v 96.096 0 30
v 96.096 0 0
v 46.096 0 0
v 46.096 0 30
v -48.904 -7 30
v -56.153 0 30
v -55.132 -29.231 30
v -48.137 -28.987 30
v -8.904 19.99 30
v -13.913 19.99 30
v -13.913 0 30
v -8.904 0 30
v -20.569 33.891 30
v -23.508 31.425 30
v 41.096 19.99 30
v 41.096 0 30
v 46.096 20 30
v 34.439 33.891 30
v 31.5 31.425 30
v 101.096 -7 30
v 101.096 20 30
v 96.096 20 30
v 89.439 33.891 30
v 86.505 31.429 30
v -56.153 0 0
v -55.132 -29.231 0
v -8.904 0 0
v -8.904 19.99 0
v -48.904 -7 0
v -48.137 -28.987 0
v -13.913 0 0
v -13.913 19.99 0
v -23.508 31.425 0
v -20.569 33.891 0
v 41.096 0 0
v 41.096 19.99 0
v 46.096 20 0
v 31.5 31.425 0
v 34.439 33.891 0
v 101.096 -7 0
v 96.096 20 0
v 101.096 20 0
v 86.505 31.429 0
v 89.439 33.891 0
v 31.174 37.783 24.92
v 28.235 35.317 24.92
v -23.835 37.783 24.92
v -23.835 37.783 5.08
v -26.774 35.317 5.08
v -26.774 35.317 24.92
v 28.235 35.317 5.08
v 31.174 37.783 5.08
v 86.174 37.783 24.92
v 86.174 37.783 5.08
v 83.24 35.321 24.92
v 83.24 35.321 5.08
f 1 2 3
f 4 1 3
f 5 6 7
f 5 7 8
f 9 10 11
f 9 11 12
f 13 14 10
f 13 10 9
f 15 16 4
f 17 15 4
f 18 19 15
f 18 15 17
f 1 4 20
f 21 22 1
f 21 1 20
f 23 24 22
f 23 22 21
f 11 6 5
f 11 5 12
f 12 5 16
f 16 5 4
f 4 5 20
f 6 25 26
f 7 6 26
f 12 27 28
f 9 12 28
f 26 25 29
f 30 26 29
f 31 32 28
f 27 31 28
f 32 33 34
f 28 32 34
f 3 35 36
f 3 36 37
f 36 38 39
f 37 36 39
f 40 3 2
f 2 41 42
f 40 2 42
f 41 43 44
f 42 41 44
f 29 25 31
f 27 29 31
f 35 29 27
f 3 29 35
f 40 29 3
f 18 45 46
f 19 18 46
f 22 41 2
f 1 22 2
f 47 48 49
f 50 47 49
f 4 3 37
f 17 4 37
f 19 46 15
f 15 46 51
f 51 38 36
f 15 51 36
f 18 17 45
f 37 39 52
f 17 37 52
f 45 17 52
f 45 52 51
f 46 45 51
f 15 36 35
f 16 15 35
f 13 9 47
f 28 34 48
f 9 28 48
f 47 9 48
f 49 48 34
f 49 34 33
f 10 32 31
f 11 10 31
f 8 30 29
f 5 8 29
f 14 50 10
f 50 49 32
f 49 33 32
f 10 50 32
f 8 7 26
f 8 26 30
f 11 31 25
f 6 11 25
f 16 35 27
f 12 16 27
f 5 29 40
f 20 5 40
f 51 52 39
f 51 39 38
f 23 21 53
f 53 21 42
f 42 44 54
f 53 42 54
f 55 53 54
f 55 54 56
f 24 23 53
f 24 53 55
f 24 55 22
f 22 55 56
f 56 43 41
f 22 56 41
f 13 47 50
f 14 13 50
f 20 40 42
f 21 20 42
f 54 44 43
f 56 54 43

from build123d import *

# Parameters (mm, degrees)
F1_DEPTH = 30
F2_SIZE2 = 5.08
F2_SIZE  = 5.08


with BuildPart() as f1:
    # F0 (on Top) → F1 (new body)
    with BuildSketch(Plane.XY):
        Polygon((-48.136686, -28.986598), (-48.904475, -7), (101.095525, -7), (101.095525, 20), (86.173893, 37.782908), (83.239773, 35.320889), (96.095525, 20), (96.095525, 0), (46.095525, 0), (46.095525, 20), (31.173893, 37.782908), (28.23475, 35.316674), (41.095525, 19.9898), (41.095525, 0), (-8.904475, 0), (-8.904475, 19.9898), (-23.834665, 37.782908), (-26.773808, 35.316674), (-13.913034, 19.9898), (-13.913034, 0), (-56.153187, 0), (-55.132422, -29.230895), align=None)
    extrude(amount=F1_DEPTH)

    # F2
    f2_edges = [f1.edges().sort_by_distance(p)[0] for p in [
        (-25.304237, 36.549791, 30),
        (-25.304237, 36.549791, 0),
        (29.704322, 36.549791, 0),
        (29.704322, 36.549791, 30),
        (84.706833, 36.551899, 30),
        (84.706833, 36.551899, 0),
    ]]
    chamfer(f2_edges, length=F2_SIZE, length2=F2_SIZE2)


solid = f1.part
